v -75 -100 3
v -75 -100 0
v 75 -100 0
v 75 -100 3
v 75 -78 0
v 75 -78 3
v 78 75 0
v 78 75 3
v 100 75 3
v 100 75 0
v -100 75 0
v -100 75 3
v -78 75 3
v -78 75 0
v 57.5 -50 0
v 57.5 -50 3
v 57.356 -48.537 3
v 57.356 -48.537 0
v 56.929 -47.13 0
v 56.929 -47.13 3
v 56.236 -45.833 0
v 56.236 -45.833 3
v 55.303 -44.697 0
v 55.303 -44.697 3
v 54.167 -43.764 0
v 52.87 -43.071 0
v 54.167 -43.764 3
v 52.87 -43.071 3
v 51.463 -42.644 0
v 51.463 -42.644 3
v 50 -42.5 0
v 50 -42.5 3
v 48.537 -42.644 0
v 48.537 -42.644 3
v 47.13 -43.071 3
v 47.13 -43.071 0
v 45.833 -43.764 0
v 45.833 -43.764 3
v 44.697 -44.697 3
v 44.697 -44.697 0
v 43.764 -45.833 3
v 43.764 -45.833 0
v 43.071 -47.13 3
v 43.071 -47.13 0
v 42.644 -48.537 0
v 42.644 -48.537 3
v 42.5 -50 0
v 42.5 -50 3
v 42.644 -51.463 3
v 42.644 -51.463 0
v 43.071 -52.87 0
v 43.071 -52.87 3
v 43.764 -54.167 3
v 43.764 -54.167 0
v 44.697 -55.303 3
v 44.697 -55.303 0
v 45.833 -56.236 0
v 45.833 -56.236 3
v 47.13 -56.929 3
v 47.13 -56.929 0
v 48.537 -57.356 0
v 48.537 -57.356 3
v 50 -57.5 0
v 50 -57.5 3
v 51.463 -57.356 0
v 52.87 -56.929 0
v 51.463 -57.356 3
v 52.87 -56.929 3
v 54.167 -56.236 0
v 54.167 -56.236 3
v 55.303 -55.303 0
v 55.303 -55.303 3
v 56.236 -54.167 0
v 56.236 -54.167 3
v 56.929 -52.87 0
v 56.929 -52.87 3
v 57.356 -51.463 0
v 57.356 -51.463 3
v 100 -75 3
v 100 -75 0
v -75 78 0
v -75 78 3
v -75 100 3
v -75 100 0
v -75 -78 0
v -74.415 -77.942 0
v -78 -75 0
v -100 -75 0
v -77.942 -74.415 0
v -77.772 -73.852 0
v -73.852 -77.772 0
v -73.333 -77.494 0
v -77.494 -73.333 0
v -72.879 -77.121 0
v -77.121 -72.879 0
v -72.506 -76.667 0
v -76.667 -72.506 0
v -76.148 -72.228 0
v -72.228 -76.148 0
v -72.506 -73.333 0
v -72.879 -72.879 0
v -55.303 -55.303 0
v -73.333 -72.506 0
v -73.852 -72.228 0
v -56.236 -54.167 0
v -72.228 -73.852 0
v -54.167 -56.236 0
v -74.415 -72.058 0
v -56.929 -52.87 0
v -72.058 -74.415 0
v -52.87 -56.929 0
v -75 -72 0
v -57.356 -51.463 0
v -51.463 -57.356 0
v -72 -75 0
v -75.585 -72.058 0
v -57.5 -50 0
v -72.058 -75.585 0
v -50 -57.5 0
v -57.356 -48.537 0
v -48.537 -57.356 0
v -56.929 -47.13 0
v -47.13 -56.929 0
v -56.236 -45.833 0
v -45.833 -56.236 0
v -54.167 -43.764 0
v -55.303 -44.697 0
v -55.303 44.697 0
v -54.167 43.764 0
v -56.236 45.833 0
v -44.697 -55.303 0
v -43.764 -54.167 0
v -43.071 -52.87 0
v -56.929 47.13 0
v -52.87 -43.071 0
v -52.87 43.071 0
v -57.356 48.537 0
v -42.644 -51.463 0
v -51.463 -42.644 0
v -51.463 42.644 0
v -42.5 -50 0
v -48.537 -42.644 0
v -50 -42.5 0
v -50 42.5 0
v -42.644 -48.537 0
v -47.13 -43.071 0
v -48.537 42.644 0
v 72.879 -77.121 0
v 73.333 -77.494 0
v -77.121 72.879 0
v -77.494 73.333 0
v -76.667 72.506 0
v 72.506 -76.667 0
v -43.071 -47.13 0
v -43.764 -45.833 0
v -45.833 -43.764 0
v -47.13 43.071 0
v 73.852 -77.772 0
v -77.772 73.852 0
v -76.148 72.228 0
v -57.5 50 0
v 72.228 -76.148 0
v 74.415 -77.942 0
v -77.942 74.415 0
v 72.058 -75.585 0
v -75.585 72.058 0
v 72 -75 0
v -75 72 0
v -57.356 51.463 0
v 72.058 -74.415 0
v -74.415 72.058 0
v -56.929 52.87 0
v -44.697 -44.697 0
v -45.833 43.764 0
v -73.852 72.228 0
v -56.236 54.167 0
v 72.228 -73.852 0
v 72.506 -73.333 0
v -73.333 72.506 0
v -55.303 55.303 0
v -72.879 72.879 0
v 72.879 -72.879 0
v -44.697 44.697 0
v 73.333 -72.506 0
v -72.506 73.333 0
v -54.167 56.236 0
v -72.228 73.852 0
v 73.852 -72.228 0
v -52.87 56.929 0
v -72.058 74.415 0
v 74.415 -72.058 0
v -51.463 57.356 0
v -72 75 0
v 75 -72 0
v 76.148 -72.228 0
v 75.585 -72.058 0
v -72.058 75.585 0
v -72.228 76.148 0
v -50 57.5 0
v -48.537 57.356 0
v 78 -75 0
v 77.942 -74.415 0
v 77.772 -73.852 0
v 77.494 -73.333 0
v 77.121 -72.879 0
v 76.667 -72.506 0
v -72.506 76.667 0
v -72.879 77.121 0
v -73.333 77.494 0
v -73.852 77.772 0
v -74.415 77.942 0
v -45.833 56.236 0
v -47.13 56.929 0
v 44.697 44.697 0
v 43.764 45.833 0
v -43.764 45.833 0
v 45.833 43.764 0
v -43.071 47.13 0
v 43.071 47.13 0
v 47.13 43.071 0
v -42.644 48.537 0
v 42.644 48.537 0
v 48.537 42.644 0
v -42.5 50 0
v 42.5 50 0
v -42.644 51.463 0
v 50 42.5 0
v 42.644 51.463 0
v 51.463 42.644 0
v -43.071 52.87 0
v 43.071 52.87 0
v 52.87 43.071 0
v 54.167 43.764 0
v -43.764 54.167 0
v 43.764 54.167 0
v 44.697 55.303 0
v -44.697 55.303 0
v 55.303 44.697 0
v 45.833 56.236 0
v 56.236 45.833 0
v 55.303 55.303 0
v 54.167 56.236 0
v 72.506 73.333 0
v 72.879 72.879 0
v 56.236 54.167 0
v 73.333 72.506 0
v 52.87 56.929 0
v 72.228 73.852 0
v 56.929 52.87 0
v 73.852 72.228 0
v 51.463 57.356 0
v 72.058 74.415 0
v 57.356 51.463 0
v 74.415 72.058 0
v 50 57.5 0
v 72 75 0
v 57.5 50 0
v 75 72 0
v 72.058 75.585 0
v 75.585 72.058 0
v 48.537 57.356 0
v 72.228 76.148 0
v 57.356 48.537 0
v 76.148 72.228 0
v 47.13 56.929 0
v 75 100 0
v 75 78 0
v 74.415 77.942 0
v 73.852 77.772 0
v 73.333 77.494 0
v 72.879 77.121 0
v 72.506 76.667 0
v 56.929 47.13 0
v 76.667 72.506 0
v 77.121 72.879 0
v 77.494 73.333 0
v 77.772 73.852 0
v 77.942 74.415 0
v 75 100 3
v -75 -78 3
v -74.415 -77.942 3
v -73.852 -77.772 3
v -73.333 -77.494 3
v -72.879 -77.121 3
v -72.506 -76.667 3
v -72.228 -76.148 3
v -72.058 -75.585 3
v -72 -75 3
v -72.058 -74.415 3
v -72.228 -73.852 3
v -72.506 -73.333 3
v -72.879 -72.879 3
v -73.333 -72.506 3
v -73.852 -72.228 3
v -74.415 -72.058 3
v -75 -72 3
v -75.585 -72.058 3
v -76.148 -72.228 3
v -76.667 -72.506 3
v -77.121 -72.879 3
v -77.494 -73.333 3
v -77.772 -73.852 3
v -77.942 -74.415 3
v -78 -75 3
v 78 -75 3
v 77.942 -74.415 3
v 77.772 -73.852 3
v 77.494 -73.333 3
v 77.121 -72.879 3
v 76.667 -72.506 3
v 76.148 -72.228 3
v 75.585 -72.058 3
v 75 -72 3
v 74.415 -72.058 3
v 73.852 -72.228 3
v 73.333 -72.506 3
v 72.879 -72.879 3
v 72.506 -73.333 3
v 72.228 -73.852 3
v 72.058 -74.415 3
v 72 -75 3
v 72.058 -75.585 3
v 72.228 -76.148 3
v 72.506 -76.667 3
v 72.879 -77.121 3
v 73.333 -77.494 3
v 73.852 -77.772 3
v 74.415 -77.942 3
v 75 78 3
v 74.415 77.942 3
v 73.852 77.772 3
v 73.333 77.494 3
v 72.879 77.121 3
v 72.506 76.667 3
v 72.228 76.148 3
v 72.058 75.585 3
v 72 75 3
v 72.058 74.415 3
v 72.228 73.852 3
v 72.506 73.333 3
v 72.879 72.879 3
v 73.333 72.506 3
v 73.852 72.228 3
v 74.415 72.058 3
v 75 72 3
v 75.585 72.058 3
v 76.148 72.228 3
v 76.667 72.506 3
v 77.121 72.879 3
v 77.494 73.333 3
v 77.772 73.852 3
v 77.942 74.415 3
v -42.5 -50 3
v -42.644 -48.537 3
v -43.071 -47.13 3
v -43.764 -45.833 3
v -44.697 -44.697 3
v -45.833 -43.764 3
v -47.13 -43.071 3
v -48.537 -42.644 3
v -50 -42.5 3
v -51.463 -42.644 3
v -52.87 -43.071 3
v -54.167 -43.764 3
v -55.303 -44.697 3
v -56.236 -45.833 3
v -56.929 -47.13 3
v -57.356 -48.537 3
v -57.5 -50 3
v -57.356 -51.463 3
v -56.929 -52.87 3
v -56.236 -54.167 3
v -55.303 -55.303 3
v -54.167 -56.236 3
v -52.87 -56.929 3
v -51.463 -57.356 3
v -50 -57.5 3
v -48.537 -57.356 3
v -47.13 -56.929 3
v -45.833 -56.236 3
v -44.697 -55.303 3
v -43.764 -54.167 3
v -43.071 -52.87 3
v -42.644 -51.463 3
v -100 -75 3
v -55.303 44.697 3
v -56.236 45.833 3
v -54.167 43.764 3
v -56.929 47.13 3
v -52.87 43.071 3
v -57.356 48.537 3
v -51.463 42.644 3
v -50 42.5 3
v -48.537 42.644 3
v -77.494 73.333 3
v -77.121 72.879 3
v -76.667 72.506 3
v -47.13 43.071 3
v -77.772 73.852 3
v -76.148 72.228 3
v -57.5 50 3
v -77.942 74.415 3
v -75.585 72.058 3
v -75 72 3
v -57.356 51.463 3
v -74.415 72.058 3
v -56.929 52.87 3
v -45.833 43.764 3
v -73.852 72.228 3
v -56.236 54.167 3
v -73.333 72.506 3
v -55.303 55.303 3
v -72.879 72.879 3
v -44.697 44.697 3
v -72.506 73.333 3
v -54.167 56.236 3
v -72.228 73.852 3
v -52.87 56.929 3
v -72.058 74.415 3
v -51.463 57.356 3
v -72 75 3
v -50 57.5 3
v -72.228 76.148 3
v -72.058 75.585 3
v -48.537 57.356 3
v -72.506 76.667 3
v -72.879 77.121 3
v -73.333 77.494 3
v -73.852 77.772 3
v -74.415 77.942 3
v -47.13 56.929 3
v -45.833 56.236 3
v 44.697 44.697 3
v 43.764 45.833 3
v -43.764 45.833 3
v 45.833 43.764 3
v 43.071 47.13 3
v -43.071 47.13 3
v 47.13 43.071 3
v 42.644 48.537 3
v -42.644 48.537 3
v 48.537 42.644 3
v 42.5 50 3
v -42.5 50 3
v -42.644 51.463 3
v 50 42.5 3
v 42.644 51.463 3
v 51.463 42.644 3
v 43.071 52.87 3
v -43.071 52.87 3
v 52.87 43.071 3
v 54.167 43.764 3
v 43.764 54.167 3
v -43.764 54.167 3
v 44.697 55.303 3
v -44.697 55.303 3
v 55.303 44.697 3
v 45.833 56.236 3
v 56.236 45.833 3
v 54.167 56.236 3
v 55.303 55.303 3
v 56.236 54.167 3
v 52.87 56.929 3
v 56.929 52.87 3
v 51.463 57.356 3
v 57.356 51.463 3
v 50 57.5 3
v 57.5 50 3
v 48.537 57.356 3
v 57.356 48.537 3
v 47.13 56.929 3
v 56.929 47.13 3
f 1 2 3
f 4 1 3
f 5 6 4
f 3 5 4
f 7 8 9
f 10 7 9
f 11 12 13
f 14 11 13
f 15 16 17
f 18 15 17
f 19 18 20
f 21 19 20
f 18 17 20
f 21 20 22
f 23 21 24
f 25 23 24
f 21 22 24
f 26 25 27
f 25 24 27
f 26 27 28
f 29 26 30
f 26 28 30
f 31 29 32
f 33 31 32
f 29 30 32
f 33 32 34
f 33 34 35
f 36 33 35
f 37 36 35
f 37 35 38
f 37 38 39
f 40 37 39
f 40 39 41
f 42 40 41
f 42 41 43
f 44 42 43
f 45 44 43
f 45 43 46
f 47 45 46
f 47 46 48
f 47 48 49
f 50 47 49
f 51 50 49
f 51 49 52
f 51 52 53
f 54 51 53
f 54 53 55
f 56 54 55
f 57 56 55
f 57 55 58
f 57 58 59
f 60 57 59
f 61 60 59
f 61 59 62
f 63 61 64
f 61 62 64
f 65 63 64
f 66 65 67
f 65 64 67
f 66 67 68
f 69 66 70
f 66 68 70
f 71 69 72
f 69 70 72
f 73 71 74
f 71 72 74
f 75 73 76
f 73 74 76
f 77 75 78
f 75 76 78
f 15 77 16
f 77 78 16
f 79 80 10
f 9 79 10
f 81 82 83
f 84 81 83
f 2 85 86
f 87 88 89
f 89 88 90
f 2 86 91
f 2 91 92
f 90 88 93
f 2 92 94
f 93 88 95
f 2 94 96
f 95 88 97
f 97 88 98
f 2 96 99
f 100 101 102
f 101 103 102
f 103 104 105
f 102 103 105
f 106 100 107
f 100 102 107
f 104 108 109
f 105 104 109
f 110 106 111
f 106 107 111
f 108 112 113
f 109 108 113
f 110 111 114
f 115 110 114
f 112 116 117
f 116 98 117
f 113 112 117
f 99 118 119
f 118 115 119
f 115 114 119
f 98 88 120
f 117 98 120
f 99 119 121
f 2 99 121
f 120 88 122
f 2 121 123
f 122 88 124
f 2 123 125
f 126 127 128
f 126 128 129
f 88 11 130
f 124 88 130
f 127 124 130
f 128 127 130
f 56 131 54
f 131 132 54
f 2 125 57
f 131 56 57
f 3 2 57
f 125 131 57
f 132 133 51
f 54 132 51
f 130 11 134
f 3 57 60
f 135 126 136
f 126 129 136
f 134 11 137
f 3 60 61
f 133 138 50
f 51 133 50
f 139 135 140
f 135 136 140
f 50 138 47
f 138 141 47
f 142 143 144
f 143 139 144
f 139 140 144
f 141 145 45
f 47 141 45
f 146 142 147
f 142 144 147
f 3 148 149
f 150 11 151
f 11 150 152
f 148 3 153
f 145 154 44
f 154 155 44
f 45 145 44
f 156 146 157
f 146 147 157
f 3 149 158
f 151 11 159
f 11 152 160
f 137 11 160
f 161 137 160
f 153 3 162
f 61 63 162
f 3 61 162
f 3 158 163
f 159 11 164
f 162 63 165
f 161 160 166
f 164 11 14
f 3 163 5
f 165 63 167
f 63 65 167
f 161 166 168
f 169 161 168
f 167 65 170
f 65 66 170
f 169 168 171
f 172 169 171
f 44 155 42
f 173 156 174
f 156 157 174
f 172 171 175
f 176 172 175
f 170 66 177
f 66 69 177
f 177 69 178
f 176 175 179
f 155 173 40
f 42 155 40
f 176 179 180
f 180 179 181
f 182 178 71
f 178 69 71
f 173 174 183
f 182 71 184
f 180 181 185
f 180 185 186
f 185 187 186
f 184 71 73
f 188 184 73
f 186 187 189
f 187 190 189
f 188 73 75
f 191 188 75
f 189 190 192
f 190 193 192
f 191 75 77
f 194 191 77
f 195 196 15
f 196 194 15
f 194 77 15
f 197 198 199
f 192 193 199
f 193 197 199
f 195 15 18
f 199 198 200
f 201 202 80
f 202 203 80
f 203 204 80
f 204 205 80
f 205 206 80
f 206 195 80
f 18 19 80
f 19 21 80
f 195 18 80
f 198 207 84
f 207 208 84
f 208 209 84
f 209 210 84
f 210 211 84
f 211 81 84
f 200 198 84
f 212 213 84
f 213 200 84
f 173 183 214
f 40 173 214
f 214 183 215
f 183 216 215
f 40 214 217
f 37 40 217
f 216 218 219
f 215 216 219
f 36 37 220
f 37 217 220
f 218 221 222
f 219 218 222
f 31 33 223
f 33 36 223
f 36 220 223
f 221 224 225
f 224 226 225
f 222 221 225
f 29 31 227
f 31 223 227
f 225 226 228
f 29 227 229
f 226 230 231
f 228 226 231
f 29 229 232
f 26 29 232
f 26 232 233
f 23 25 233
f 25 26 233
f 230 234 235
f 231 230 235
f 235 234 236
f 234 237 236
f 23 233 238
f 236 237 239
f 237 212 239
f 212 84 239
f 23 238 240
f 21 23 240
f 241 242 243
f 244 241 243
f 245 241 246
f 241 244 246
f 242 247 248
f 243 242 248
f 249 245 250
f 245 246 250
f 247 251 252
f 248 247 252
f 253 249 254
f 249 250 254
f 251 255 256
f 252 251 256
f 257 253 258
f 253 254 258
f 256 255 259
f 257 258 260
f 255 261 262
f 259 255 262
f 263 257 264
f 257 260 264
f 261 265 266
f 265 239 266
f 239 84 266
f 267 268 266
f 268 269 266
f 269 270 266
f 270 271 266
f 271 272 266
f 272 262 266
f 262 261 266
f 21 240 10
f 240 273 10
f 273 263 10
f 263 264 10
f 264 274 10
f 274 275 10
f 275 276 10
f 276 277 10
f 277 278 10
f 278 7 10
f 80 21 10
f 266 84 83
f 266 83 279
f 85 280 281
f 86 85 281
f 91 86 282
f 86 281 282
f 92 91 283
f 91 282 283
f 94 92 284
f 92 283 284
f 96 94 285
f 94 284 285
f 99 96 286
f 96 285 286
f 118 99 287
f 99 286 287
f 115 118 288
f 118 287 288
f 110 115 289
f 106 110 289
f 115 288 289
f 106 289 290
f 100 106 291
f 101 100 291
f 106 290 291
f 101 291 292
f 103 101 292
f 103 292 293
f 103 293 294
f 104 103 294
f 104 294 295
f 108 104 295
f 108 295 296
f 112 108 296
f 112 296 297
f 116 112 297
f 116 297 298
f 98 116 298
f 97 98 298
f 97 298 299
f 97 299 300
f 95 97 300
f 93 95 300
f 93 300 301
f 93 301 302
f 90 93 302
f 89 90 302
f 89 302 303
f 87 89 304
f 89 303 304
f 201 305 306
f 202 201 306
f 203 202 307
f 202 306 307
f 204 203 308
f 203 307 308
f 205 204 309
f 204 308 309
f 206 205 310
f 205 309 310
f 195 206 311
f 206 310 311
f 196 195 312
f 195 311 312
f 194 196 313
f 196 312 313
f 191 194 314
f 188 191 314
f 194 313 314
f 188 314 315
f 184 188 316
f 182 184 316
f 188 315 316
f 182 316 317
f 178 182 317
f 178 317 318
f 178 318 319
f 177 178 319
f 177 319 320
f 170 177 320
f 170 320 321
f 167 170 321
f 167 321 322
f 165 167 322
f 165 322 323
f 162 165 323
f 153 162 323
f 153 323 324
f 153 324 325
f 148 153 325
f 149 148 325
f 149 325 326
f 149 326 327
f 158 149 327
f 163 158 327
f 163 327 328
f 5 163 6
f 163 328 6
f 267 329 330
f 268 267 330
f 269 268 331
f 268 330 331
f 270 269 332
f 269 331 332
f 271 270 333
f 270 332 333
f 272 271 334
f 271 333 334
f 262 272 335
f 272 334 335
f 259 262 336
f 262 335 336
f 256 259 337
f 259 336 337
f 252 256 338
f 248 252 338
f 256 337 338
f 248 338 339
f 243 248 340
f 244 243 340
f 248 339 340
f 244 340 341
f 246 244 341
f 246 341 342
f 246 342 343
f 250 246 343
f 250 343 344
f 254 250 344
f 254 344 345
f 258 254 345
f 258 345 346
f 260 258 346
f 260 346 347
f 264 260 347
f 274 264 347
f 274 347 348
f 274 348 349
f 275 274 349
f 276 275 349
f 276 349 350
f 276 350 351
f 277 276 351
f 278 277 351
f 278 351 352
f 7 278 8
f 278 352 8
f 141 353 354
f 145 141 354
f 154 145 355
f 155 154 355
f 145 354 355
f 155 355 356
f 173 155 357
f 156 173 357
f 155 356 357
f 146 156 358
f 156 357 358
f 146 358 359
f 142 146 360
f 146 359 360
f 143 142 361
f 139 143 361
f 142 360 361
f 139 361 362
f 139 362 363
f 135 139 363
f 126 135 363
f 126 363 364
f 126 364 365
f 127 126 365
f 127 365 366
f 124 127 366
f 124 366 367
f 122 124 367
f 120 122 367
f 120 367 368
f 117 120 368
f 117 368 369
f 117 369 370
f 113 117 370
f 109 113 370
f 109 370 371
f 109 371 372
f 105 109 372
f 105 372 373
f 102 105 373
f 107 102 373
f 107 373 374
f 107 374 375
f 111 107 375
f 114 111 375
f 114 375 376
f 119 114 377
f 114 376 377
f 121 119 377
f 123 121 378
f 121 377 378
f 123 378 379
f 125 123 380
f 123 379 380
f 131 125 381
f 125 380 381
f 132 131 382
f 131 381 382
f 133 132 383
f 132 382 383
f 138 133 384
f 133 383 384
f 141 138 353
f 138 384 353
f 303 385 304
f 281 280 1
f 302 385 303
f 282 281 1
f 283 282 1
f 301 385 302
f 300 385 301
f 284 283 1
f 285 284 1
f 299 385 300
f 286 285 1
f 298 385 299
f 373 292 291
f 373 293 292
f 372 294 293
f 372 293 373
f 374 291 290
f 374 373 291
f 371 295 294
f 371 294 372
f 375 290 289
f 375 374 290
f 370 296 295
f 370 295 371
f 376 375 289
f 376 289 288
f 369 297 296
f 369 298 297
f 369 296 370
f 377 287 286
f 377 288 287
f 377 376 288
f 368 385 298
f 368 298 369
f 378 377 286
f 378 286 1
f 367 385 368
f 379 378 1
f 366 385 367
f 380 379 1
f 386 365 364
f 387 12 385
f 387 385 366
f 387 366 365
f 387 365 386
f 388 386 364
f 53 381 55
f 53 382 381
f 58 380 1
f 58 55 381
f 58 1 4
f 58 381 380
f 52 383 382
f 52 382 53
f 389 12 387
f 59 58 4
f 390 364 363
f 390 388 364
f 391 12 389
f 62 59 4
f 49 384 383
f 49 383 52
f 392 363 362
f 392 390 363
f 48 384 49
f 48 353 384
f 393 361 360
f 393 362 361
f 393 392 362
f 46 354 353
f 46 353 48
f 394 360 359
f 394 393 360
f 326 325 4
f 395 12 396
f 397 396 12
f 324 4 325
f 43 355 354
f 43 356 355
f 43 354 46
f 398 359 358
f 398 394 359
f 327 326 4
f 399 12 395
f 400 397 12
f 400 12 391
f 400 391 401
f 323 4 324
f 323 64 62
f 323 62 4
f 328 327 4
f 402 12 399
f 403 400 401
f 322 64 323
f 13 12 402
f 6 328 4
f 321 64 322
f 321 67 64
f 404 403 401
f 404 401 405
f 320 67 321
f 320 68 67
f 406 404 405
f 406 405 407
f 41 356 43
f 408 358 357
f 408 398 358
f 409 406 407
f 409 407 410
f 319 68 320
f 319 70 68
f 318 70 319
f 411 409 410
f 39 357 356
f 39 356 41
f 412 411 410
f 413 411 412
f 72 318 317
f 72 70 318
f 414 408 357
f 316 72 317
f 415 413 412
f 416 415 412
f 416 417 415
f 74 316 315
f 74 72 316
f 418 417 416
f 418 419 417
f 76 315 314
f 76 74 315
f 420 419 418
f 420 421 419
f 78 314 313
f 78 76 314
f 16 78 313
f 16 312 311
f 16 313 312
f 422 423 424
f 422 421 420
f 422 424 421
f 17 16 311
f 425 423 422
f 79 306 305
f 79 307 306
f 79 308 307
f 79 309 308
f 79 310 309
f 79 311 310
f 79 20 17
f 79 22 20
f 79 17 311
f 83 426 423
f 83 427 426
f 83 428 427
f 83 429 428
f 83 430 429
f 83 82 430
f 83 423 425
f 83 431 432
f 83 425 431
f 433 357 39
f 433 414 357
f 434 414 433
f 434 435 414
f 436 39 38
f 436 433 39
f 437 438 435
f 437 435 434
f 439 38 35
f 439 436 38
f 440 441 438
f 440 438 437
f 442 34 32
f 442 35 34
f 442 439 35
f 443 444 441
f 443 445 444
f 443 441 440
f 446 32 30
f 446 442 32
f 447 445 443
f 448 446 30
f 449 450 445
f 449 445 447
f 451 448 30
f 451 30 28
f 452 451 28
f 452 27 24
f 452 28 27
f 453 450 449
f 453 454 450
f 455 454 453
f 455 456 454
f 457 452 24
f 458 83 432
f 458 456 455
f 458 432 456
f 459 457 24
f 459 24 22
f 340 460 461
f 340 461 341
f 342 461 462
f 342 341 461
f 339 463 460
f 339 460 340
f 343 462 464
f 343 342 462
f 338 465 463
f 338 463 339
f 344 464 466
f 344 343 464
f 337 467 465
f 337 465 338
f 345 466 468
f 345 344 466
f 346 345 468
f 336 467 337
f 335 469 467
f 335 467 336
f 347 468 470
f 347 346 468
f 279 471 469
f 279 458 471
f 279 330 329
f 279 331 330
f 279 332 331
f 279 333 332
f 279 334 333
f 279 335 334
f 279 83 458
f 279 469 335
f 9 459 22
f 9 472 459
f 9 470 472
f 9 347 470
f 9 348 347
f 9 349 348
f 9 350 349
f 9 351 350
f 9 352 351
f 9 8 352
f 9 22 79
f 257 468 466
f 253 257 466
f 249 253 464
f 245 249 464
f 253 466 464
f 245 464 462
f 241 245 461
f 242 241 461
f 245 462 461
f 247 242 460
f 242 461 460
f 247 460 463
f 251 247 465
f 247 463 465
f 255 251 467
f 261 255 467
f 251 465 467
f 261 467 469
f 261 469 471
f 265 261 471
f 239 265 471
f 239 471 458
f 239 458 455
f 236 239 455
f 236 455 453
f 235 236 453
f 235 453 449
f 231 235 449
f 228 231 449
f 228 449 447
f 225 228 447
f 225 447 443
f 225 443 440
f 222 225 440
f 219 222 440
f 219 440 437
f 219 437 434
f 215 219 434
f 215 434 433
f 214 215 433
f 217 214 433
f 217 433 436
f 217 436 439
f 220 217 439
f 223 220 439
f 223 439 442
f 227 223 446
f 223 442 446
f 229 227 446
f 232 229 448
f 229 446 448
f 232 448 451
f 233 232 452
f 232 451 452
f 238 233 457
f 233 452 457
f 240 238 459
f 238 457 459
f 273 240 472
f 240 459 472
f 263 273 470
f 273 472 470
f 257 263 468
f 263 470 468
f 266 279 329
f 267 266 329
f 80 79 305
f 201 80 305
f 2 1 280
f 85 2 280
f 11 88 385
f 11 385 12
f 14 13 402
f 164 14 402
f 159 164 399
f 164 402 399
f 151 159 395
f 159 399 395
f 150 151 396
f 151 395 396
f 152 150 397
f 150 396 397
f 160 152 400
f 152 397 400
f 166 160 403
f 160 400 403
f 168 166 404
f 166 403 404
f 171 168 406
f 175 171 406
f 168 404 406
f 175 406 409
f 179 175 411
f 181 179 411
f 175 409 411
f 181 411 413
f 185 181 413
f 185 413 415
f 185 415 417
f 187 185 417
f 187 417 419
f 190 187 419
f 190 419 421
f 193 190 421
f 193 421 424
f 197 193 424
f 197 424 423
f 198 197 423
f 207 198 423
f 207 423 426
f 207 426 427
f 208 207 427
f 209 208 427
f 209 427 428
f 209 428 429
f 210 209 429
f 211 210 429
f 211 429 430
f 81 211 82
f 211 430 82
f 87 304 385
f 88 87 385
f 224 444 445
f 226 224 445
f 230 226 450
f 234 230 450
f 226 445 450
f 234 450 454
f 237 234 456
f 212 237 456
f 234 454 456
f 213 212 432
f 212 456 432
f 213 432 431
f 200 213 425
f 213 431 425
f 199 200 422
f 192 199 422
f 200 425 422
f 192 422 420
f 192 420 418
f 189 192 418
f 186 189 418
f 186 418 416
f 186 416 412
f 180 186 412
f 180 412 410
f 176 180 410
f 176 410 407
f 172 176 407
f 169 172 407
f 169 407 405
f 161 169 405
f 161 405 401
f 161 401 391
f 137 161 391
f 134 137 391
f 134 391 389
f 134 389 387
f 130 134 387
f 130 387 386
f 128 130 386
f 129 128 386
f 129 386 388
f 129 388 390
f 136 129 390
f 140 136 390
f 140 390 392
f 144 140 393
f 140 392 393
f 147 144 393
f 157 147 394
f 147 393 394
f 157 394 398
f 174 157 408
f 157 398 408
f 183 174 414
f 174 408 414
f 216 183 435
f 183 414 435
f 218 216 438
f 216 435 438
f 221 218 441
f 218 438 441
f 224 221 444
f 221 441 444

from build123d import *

# Parameters (mm, degrees)
F0_W     = 200
F0_H     = 200
F1_DEPTH = 3
F3_DEPTH = 3.001
F4_R     = 7.5
F5_DEPTH = 3.001


with BuildPart() as f1:
    # F0 (on Top) → F1 (new body)
    with BuildSketch(Plane.XY):
        Rectangle(F0_W, F0_H)
    extrude(amount=F1_DEPTH)

    # F2 (on face) → F3 (cut, through all)
    with BuildSketch(Plane.XY.offset(3)):
        with BuildLine():
            Line((-75, 100), (-100, 100))
            Line((-100, 100), (-100, 75))
            Line((-100, 75), (-78, 75))
            ThreePointArc((-78, 75), (-72.87868, 72.87868), (-75, 78))
            Line((-75, 78), (-75, 100))
        make_face()
        with BuildLine():
            ThreePointArc((75, 78), (72.87868, 72.87868), (78, 75))
            Line((78, 75), (100, 75))
            Line((100, 75), (100, 100))
            Line((100, 100), (75, 100))
            Line((75, 100), (75, 78))
        make_face()
        with BuildLine():
            Line((-100, -100), (-75, -100))
            Line((-75, -100), (-75, -78))
            ThreePointArc((-75, -78), (-72.87868, -72.87868), (-78, -75))
            Line((-78, -75), (-100, -75))
            Line((-100, -75), (-100, -100))
        make_face()
        with BuildLine():
            Line((100, -75), (78, -75))
            ThreePointArc((78, -75), (72.87868, -72.87868), (75, -78))
            Line((75, -78), (75, -100))
            Line((75, -100), (100, -100))
            Line((100, -100), (100, -75))
        make_face()
    extrude(amount=-F3_DEPTH, mode=Mode.SUBTRACT)

    # F4 (on face) → F5 (cut, through all)
    with BuildSketch(Plane.XY.offset(3)):
        with Locations((-50, 50)):
            Circle(F4_R)
        with Locations((50, 50)):
            Circle(F4_R)
        with Locations((-50, -50)):
            Circle(F4_R)
        with Locations((50, -50)):
            Circle(F4_R)
    extrude(amount=-F5_DEPTH, mode=Mode.SUBTRACT)


solid = f1.part
